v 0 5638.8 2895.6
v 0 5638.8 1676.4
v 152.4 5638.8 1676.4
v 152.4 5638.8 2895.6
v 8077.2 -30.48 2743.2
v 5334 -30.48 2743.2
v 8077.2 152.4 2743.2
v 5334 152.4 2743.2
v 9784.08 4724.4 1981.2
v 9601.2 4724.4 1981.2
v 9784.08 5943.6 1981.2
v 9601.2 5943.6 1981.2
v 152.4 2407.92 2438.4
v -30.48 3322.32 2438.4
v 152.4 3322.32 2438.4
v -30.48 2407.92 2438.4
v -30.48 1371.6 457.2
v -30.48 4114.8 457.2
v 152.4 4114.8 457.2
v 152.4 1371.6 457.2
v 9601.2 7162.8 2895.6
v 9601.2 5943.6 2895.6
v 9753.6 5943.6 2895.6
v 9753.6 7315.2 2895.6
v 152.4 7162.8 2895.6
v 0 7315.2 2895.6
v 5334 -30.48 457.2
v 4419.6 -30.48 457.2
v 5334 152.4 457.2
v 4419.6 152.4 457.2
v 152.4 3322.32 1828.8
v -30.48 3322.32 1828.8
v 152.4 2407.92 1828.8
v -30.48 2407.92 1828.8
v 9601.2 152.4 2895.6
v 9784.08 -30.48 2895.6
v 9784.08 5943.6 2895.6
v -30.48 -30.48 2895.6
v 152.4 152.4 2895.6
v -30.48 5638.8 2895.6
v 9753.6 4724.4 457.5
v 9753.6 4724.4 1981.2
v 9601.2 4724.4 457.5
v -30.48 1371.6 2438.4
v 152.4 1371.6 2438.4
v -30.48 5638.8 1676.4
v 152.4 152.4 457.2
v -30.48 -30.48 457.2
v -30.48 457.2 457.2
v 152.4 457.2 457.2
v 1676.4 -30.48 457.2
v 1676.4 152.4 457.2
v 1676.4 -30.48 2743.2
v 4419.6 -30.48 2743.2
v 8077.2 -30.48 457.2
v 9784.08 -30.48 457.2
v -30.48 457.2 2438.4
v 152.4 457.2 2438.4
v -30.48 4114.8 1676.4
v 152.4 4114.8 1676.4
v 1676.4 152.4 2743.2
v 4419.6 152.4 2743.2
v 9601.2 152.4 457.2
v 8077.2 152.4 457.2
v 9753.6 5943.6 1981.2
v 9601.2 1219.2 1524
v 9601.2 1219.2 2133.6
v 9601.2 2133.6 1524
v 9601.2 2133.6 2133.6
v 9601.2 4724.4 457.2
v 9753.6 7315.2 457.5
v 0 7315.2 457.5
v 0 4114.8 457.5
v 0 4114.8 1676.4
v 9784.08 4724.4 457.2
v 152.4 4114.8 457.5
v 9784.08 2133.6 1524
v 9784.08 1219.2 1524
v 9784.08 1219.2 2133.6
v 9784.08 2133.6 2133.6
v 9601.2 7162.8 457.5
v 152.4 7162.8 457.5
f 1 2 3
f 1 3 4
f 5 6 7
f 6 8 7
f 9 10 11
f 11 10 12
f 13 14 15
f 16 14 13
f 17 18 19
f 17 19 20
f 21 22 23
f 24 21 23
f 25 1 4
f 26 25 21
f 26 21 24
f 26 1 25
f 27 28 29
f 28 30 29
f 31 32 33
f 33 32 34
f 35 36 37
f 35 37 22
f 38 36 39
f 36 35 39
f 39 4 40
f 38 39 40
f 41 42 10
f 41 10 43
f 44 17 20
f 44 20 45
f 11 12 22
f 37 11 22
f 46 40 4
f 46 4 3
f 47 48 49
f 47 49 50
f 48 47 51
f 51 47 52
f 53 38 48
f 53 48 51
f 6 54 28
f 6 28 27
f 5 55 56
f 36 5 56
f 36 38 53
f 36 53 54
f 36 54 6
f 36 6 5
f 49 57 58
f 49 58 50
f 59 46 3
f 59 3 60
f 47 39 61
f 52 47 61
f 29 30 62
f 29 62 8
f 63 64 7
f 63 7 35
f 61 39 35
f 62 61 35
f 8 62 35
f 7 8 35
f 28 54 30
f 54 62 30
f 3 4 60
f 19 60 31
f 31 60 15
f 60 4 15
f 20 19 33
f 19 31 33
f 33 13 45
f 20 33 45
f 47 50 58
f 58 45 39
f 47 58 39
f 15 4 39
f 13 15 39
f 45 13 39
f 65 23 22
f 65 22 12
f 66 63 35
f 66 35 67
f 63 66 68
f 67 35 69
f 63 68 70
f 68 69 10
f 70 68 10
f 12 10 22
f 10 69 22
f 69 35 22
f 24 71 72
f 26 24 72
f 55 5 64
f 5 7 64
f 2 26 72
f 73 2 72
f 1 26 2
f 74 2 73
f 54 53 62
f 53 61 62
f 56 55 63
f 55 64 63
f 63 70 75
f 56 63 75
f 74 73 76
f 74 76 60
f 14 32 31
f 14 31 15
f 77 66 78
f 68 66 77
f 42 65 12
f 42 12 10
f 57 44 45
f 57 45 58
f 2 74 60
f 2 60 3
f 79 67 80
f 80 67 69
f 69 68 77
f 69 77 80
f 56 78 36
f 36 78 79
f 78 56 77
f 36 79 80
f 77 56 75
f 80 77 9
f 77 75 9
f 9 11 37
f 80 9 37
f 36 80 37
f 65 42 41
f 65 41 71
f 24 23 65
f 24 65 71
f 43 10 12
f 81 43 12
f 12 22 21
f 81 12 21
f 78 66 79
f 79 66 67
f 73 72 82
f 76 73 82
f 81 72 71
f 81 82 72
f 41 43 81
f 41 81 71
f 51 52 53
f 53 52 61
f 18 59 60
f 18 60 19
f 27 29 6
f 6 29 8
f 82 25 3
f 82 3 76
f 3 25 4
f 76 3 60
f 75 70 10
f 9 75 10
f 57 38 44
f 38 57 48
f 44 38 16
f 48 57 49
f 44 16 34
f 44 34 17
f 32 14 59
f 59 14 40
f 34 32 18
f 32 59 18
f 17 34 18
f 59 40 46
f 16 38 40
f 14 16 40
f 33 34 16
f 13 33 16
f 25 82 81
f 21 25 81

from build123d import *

# Parameters (mm, degrees)
F0_W           = 9753.6
F0_H           = 7315.2
F1_DEPTH       = 304.8
F2_W           = 914.4
F2_H           = 152.4
F3_DEPTH       = 152.4
F5_DEPTH       = 2438.4
F7_DEPTH       = 152.4
F9_DEPTH       = 152.4
F10_W          = 914.4
F10_H          = 609.6
F11_DEPTH      = 152.4
F11_DEPTH_BACK = 30.48
F13_DEPTH      = 152.4
F13_DEPTH_BACK = 30.48
F14_W          = 914.4
F14_H          = 609.6
F15_DEPTH      = 182.88
F16_W          = 9753.6
F16_H          = 7315.2
F17_DEPTH      = 457.5


with BuildPart() as f1:
    # F0 (on Top) → F1 (new body)
    with BuildSketch(Plane.XY):
        with Locations((4876.8, 3657.6)):
            Rectangle(F0_W, F0_H)
    extrude(amount=F1_DEPTH)

    # F2 (on face) → F3 (join)
    with BuildSketch(Plane.XY.offset(304.8)):
        with Locations((4876.8, 76.2)):
            Rectangle(F2_W, F2_H)
        Polygon((8077.2, 152.4), (8077.2, 0), (9753.6, 0), (9753.6, 7315.2), (0, 7315.2), (0, 1371.6), (152.4, 1371.6), (152.4, 7162.8), (9601.2, 7162.8), (9601.2, 152.4), align=None)
        Polygon((0, 0), (1676.4, 0), (1676.4, 152.4), (152.4, 152.4), (152.4, 457.2), (0, 457.2), align=None)
    extrude(amount=F3_DEPTH)

    # F4 (on face) → F5 (join)
    with BuildSketch(Plane.XY.offset(457.2)):
        Polygon((0, 7315.2), (0, 7162.8), (9601.2, 7162.8), (9753.6, 7162.8), (9753.6, 7315.2), align=None)
    extrude(amount=F5_DEPTH)

    # F6 (on face) → F7 (join)
    with BuildSketch(Plane.YZ.offset(9753.6)):
        Polygon((4724.4, 1981.2), (4724.4, 457.2), (7162.8, 457.2), (7162.8, 2895.6), (5943.6, 2895.6), (5943.6, 1981.2), align=None)
    extrude(amount=-F7_DEPTH)

    # F8 (on face) → F9 (join)
    with BuildSketch(Plane(origin=(0, 0, 0), x_dir=(0, -1, 0), z_dir=(-1, 0, 0))):
        Polygon((-7162.8, 457.2), (-4114.8, 457.2), (-4114.8, 1676.4), (-5638.8, 1676.4), (-5638.8, 2895.6), (-7162.8, 2895.6), align=None)
    extrude(amount=-F9_DEPTH)

    # F16 (on face) → F17 (cut)
    with BuildSketch(Plane(origin=(0, 0, 0), x_dir=(1, 0, 0), z_dir=(0, 0, -1))):
        with Locations((4876.8, -3657.6)):
            Rectangle(F16_W, F16_H)
    extrude(amount=-F17_DEPTH, mode=Mode.SUBTRACT)


with BuildPart() as f11:
    # F10 (on face) → F11 (new body, two sides)
    with BuildSketch(Plane.YZ.offset(9753.6)) as f11_sk:
        Polygon((5943.6, 1981.2), (5943.6, 2895.6), (0, 2895.6), (0, 457.2), (4724.4, 457.2), (4724.4, 1981.2), align=None)
        with Locations((1676.4, 1828.8)):
            Rectangle(F10_W, F10_H, mode=Mode.SUBTRACT)
    extrude(amount=-F11_DEPTH)
    extrude(f11_sk.sketch, amount=F11_DEPTH_BACK)

    # F12 (on face) → F13 (join, two sides)
    with BuildSketch(Plane.XZ) as f13_sk:
        Polygon((-30.48, 457.2), (0, 457.2), (1676.4, 457.2), (1676.4, 2743.2), (4419.6, 2743.2), (4419.6, 457.2), (5334, 457.2), (5334, 2743.2), (8077.2, 2743.2), (8077.2, 457.2), (9601.2, 457.2), (9753.6, 457.2), (9784.08, 457.2), (9784.08, 2895.6), (9601.2, 2895.6), (152.4, 2895.6), (-30.48, 2895.6), align=None)
    extrude(amount=-F13_DEPTH)
    extrude(f13_sk.sketch, amount=F13_DEPTH_BACK)

    # F14 (on face) → F15 (join)
    with BuildSketch(Plane(origin=(-30.48, 0, 0), x_dir=(0, -1, 0), z_dir=(-1, 0, 0))):
        Polygon((30.48, 2895.6), (-5638.8, 2895.6), (-5638.8, 1676.4), (-4114.8, 1676.4), (-4114.8, 457.2), (-1371.6, 457.2), (-1371.6, 2438.4), (-457.2, 2438.4), (-457.2, 457.2), (30.48, 457.2), align=None)
        with Locations((-2865.12, 2133.6)):
            Rectangle(F14_W, F14_H, mode=Mode.SUBTRACT)
    extrude(amount=-F15_DEPTH)


solid = Compound([f1.part, f11.part])
